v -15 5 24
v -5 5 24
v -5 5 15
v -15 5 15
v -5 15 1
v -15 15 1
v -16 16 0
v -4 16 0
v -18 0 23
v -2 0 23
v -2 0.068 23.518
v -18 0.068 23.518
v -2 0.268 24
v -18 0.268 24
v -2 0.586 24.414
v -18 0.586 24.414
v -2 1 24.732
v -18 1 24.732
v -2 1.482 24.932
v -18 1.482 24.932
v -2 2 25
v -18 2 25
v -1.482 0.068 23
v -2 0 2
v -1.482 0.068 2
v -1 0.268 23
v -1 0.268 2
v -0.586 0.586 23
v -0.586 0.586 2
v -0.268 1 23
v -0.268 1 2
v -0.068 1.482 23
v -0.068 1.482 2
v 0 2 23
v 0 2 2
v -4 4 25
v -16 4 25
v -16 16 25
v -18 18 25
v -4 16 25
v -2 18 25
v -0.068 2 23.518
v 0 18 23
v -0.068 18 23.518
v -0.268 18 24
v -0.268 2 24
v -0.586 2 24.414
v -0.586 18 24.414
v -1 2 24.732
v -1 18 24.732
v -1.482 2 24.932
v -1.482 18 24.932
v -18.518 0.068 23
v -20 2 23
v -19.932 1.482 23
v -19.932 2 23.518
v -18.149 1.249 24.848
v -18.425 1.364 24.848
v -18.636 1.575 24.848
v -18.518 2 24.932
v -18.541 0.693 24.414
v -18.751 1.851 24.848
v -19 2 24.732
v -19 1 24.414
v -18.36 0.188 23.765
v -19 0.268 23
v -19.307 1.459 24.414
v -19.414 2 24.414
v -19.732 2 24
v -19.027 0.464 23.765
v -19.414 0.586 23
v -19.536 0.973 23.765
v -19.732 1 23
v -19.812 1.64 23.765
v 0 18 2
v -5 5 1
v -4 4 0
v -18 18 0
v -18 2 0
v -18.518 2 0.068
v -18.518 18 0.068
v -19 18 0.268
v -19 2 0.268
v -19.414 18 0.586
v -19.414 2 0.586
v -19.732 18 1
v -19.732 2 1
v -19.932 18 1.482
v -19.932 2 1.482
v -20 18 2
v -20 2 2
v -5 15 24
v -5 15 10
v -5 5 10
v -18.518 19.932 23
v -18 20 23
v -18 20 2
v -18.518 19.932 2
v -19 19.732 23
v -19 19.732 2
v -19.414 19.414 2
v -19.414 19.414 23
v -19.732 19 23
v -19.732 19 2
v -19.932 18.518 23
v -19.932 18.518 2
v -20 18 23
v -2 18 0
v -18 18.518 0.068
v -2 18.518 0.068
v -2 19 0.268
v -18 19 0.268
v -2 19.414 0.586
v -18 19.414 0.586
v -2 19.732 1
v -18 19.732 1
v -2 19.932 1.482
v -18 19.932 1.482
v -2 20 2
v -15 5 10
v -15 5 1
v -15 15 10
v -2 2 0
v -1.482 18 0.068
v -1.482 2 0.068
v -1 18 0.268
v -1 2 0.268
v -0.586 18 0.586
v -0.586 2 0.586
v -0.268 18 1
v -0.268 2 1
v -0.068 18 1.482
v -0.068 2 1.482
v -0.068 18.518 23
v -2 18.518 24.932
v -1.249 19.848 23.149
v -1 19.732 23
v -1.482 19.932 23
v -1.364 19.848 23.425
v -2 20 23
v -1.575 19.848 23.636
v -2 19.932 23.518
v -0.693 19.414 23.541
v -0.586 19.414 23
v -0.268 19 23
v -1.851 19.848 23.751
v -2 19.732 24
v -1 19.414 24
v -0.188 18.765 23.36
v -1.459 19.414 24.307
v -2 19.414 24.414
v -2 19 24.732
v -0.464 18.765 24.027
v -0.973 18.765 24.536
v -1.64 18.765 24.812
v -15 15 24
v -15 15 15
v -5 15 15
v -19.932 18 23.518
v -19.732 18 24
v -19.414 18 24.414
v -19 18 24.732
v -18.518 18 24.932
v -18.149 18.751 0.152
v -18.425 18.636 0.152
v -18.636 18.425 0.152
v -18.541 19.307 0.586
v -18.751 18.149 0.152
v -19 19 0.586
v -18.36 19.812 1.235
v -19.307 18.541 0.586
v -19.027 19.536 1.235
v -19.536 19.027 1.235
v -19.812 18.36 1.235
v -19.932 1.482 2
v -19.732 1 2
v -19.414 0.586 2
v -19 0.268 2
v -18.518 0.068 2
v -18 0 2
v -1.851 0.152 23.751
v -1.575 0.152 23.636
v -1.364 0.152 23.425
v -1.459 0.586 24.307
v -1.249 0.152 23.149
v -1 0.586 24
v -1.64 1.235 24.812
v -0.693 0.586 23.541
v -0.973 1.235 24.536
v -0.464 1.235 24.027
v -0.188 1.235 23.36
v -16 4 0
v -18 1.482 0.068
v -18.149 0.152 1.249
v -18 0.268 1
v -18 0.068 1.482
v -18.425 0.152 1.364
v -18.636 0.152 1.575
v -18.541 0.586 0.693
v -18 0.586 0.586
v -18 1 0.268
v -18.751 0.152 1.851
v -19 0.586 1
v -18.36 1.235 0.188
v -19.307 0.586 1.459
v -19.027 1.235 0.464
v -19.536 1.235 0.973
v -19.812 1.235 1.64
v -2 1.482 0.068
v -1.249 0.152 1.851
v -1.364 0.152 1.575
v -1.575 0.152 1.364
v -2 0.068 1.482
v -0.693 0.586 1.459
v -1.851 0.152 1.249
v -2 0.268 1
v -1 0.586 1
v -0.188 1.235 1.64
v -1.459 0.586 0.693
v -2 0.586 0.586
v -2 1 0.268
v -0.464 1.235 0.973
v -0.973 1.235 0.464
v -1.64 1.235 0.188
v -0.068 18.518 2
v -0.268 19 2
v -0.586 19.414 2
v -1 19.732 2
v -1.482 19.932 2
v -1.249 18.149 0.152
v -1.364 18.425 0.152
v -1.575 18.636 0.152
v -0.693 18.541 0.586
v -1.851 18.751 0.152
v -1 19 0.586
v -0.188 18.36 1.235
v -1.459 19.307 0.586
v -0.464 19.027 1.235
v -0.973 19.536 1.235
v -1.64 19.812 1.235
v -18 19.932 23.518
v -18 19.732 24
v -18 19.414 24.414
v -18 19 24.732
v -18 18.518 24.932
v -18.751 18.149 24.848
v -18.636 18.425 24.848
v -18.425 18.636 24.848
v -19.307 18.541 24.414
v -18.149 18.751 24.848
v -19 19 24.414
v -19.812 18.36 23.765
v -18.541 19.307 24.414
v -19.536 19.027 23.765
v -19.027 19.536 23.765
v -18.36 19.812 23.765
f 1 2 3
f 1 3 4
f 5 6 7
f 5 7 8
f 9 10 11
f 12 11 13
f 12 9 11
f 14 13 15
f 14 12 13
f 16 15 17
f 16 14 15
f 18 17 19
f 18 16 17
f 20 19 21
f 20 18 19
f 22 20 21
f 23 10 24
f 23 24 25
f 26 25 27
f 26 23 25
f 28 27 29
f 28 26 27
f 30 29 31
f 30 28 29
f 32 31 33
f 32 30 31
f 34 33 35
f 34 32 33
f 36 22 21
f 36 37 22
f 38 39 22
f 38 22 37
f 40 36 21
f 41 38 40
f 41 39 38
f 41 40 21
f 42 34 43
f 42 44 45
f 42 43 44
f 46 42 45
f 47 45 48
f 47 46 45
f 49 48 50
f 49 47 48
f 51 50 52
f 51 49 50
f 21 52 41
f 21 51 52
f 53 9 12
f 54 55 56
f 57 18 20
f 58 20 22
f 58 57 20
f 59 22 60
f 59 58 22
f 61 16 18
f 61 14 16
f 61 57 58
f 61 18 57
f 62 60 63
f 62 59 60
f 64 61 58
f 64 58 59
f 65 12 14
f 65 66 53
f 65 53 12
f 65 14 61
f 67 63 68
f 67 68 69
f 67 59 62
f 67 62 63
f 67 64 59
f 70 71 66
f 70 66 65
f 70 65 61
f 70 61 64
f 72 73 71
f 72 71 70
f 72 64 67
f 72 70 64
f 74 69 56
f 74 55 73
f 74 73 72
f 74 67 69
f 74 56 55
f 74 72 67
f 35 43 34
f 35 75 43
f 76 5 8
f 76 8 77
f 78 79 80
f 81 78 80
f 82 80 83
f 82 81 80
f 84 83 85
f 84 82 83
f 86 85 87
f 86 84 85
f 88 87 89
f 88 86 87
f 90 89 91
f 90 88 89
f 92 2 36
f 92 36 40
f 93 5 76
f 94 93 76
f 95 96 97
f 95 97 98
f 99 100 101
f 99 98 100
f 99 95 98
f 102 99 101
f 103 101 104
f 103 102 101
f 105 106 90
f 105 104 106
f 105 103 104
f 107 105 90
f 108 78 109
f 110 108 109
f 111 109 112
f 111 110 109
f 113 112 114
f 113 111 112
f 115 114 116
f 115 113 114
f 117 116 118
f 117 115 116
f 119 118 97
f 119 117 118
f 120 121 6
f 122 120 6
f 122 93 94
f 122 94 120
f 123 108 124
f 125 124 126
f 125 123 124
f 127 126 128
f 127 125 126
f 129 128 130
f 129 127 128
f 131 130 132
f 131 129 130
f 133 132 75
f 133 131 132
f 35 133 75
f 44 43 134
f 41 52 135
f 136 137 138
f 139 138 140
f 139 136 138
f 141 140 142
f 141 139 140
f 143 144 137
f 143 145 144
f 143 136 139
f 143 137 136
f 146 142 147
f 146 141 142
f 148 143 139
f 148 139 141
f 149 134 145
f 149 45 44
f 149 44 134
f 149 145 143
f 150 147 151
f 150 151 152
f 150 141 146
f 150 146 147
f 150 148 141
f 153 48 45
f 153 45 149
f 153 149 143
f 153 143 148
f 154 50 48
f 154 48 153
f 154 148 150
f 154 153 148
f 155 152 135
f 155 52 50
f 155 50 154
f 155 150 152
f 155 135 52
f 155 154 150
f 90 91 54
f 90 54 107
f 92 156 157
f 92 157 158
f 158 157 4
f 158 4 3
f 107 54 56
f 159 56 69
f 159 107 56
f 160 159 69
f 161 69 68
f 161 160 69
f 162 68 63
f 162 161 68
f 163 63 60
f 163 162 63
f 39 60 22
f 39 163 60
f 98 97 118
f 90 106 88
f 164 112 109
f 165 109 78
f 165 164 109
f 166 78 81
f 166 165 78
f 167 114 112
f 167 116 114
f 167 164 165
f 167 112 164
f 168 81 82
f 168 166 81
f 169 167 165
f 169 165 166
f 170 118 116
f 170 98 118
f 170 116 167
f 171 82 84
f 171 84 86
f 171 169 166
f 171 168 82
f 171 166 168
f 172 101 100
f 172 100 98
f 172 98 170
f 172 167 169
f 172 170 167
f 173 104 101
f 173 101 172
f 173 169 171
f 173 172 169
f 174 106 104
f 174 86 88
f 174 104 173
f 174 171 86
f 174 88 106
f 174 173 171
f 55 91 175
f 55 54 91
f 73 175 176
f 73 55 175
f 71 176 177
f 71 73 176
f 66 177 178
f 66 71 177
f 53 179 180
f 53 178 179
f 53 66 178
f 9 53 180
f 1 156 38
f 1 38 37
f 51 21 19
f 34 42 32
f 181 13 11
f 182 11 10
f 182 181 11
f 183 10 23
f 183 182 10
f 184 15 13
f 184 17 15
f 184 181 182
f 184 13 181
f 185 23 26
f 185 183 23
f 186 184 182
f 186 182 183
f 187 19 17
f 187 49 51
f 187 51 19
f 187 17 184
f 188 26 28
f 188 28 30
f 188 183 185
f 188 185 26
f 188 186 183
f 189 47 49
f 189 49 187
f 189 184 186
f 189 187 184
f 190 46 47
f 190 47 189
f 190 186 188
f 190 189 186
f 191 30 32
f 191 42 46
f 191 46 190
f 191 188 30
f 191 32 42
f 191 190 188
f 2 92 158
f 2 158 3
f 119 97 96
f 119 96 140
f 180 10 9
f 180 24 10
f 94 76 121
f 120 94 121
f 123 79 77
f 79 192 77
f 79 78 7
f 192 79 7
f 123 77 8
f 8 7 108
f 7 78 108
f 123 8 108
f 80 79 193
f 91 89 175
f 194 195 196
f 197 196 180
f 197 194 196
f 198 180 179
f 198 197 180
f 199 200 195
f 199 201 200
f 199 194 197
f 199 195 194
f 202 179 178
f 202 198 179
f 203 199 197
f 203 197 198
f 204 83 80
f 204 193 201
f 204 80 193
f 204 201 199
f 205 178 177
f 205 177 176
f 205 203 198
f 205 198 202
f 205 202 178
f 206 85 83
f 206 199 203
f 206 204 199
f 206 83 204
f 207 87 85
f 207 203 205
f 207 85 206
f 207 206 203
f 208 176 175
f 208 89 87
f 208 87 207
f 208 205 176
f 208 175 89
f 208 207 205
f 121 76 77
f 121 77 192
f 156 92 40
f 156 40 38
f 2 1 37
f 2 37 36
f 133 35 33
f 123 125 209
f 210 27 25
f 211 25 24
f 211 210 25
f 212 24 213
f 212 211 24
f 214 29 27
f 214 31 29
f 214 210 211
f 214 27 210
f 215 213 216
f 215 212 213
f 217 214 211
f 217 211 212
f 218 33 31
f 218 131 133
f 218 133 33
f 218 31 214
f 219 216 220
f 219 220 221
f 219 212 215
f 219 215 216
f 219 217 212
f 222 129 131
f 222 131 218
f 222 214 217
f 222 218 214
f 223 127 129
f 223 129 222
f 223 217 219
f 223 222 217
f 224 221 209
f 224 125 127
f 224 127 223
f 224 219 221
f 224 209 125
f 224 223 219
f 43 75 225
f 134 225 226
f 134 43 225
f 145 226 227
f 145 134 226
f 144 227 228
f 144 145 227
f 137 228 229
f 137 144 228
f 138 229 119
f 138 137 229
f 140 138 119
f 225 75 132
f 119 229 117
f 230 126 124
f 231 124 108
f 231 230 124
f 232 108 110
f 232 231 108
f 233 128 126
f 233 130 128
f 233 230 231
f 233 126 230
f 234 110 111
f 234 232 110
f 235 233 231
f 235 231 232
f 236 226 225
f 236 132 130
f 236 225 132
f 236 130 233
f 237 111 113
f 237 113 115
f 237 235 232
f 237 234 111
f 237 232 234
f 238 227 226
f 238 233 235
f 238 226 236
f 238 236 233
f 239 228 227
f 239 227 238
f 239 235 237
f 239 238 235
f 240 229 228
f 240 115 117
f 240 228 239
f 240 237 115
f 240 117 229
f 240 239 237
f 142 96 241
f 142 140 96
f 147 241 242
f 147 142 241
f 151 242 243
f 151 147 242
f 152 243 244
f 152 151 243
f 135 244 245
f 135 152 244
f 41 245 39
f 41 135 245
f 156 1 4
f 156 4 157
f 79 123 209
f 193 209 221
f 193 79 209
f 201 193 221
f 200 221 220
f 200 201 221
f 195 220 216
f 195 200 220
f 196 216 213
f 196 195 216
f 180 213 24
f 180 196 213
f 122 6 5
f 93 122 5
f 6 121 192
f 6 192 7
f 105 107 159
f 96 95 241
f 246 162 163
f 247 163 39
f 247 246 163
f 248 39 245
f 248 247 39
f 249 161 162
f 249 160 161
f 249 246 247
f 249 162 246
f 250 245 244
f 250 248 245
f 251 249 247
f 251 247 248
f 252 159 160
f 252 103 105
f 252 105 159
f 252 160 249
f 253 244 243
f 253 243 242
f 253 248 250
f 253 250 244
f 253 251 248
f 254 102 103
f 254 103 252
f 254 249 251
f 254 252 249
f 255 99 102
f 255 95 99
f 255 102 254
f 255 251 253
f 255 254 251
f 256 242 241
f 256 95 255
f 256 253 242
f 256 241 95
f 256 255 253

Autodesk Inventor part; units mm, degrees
ref_plane "YZ Plane" through (0, 0, 0) normal (1, 0, 0) x (0, 1, 0)
ref_plane "XZ Plane" through (0, 0, 0) normal (0, 1, 0) x (-1, 0, 0)
ref_plane "XY Plane" through (0, 0, 0) normal (0, 0, 1) x (1, 0, 0)
sketch "Sketch14" plane through (0, 0, 0) normal (0, 0, 1) x (1, 0, 0)
  line L0 (0, 0) -> (-20, 0)
  line L1 (-20, 0) -> (-20, 20)
  line L2 (-20, 20) -> (0, 20)
  line L3 (0, 20) -> (0, 0)
  line L4 (-5, 5) -> (-10, 5)
  line L5 (-10, 5) -> (-10, 10)
  line L6 (-10, 10) -> (-5, 10)
  line L7 (-5, 10) -> (-5, 5)
  dimension "d71" = 20
  dimension "d72" = 20
  dimension "d73" = 5
  dimension "d74" = 5
extrude "Extrusion9" add sketch "Sketch14" along normal blind 25 contours L0 L1 L2 L3 | L4 L5 L6 L7
fillet "Fillet1" radius 2 12 edges at (-20, 20, 12.5) (-20, 10, 0) (-20, 0, 12.5) (-20, 10, 25) (0, 10, 25) (-10, 20, 25) (0, 20, 12.5) (-10, 20, 0) (-10, 0, 25) (0, 10, 0) (0, 0, 12.5) (-10, 0, 0)
sketch "Sketch24" plane through (0, 0, 25) normal (0, 0, 1) x (1, 0, 0)
  line L0 (-15, 15) -> (-5, 15)
  line L1 (-5, 15) -> (-5, 5)
  line L2 (-5, 5) -> (-15, 5)
  line L3 (-15, 5) -> (-15, 15)
  point P0 (0, 0)
  dimension "d176" = 10
  dimension "d177" = 10
extrude "Extrusion16" cut sketch "Sketch24" against normal blind 10
sketch "Sketch31" plane through (0, 0, 0) normal (0, 0, -1) x (-1, 0, 0)
  line L0 (5, 5) -> (15, 5)
  line L1 (15, 5) -> (15, 15)
  line L2 (15, 15) -> (5, 15)
  line L3 (5, 15) -> (5, 5)
  point P0 (0, 0)
  dimension "d231" = 10
  dimension "d232" = 10
extrude "Extrusion18" cut sketch "Sketch31" against normal blind 10
chamfer "Chamfer15" distance 1 angle 45 8 edges at (-10, 15, 0) (-15, 10, 0) (-10, 5, 0) (-5, 10, 0) (-10, 15, 25) (-5, 10, 25) (-10, 5, 25) (-15, 10, 25)
properties part number "Hole_TestFits"
